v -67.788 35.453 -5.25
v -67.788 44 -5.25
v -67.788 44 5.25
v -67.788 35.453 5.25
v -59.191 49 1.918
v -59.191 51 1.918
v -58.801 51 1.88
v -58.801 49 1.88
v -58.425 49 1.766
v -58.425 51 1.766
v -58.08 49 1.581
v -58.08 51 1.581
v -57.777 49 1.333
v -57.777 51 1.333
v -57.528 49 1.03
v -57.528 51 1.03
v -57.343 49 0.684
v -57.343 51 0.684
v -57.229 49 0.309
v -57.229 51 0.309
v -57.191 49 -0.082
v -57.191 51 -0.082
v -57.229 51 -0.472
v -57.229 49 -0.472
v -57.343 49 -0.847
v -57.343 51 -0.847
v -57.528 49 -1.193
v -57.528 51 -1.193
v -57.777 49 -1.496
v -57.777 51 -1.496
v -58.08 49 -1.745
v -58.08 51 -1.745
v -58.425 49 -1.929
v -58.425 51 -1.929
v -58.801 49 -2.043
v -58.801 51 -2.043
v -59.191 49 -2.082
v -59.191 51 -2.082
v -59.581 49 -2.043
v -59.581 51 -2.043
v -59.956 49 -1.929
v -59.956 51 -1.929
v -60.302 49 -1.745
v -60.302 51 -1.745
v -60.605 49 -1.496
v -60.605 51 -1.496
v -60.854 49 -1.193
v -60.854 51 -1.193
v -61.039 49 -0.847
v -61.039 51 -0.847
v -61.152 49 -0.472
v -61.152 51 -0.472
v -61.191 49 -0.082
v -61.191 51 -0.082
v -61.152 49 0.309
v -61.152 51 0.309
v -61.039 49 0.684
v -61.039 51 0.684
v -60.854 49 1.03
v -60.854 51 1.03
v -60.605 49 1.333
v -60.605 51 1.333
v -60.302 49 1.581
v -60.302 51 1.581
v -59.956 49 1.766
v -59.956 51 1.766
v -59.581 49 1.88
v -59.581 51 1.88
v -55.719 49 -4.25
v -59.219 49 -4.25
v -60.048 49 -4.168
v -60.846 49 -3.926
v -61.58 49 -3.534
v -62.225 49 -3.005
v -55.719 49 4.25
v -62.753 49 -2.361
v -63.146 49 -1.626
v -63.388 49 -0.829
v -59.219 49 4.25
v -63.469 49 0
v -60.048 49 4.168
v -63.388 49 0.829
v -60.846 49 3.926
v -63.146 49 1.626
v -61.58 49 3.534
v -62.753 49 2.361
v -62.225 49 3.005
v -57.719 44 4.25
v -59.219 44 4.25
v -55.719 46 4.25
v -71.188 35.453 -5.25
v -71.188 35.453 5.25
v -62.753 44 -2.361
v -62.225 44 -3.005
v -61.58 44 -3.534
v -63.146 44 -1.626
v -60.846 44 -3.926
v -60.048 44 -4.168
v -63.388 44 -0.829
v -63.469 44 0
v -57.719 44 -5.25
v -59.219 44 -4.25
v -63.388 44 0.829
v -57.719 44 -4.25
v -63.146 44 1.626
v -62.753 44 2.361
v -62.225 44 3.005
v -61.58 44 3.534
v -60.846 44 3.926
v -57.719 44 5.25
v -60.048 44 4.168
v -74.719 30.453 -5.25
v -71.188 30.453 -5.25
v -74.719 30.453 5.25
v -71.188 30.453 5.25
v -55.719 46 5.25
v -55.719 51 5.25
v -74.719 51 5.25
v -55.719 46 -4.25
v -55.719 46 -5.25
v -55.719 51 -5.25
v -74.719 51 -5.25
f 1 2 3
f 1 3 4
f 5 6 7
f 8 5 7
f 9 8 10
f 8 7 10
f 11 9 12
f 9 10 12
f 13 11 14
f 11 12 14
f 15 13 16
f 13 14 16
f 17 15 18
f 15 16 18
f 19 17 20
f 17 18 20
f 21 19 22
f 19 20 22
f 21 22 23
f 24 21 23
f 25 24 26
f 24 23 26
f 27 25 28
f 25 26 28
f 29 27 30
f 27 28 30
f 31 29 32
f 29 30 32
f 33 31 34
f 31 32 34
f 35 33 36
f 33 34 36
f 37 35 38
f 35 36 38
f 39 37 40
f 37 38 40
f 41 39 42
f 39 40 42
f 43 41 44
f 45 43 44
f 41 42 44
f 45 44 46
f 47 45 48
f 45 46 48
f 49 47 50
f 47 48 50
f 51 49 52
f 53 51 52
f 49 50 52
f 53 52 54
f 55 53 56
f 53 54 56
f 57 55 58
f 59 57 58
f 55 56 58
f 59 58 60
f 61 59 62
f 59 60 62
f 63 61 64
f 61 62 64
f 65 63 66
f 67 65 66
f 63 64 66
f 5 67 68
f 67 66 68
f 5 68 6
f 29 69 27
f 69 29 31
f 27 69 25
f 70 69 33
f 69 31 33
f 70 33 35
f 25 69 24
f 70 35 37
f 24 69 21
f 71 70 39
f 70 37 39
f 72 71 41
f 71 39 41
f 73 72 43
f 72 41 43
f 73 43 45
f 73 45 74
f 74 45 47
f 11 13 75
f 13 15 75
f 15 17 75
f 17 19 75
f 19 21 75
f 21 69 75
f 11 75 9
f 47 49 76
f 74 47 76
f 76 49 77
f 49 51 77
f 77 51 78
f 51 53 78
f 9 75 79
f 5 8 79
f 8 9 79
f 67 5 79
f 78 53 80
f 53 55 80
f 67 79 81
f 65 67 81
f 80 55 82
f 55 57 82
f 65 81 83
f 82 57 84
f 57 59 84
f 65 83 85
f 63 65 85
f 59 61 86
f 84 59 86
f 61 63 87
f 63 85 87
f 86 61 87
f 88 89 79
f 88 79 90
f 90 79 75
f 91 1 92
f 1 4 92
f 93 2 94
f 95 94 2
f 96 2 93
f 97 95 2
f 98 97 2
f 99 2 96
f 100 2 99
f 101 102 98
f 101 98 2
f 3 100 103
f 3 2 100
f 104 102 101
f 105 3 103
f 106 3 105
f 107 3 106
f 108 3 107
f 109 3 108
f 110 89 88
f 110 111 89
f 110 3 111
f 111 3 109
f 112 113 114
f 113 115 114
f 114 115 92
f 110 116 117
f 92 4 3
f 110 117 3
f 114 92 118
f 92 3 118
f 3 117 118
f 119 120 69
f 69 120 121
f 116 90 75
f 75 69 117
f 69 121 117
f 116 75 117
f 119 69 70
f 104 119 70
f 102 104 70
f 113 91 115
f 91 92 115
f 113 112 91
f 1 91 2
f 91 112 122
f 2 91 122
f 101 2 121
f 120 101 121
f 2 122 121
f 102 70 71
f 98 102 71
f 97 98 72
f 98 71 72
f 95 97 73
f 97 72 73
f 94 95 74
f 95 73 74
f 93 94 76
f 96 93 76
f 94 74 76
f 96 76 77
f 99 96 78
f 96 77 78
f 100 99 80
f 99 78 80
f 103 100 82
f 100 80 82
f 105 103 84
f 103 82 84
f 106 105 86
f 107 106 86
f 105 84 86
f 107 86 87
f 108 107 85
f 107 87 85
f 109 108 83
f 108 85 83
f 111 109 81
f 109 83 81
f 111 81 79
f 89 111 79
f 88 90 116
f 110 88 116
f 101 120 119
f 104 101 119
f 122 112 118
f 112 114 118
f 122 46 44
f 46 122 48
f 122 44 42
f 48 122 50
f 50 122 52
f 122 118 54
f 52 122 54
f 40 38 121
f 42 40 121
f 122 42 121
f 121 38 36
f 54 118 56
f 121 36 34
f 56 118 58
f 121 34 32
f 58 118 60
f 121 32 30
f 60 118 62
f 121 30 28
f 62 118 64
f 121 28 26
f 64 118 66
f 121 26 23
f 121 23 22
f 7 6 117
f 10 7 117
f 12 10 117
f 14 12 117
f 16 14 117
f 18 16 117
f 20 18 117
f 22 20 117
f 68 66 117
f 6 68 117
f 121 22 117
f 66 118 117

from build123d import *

# Parameters (mm, degrees)
EXTRUSION1_DEPTH        = 5.25
EXTRUSION2_DEPTH        = 5
ESQUISSE3_R             = 2
ENL_V_MAT_EXTRU_1_DEPTH = 2
CHANFREIN1_SIZE         = 2


with BuildPart() as part:
    # Esquisse1 → Extrusion1 (new, symmetric)
    with BuildSketch(Plane.XY):
        Polygon((-55.719296469, 49), (-67.787598819, 49), (-67.787598819, 35.452607164), (-71.187598819, 35.452607164), (-71.187598819, 30.452607164), (-74.719296469, 30.452607164), (-74.719296469, 51), (-55.719296469, 51), align=None)
    extrude(amount=EXTRUSION1_DEPTH, both=True)

    # Esquisse2 → Extrusion2 (add)
    with BuildSketch(Plane.XZ.offset(-49)):
        with BuildLine():
            Line((-55.719296469, 5.25), (-69.802319992, 5.25))
            Line((-69.802319992, 5.25), (-69.802319992, -5.25))
            Line((-69.802319992, -5.25), (-55.719296469, -5.25))
            Line((-55.719296469, -5.25), (-55.719296469, -4.25))
            Line((-55.719296469, -4.25), (-59.219296469, -4.25))
            ThreePointArc((-59.219296469, -4.25), (-63.469296469, 0), (-59.219296469, 4.25))
            Line((-59.219296469, 4.25), (-55.719296469, 4.25))
            Line((-55.719296469, 4.25), (-55.719296469, 5.25))
        make_face()
    extrude(amount=EXTRUSION2_DEPTH)

    # Esquisse3 → Enlèv. mat.-Extru.1 (cut)
    with BuildSketch(Plane(origin=(0, 51, 0), x_dir=(-1, 0, 0), z_dir=(0, 1, 0))):
        with Locations(Location((59.190865046, -0.081564641, 0), (0, 0, 90))):
            Circle(ESQUISSE3_R)
    extrude(amount=-ENL_V_MAT_EXTRU_1_DEPTH, mode=Mode.SUBTRACT)

    # Chanfrein1
    chanfrein1_edges = [part.edges().sort_by_distance(p)[0] for p in [
        (-55.719296469, 44, -4.75),
        (-55.719296469, 44, 4.75),
    ]]
    chamfer(chanfrein1_edges, length=CHANFREIN1_SIZE)


solid = part.part
